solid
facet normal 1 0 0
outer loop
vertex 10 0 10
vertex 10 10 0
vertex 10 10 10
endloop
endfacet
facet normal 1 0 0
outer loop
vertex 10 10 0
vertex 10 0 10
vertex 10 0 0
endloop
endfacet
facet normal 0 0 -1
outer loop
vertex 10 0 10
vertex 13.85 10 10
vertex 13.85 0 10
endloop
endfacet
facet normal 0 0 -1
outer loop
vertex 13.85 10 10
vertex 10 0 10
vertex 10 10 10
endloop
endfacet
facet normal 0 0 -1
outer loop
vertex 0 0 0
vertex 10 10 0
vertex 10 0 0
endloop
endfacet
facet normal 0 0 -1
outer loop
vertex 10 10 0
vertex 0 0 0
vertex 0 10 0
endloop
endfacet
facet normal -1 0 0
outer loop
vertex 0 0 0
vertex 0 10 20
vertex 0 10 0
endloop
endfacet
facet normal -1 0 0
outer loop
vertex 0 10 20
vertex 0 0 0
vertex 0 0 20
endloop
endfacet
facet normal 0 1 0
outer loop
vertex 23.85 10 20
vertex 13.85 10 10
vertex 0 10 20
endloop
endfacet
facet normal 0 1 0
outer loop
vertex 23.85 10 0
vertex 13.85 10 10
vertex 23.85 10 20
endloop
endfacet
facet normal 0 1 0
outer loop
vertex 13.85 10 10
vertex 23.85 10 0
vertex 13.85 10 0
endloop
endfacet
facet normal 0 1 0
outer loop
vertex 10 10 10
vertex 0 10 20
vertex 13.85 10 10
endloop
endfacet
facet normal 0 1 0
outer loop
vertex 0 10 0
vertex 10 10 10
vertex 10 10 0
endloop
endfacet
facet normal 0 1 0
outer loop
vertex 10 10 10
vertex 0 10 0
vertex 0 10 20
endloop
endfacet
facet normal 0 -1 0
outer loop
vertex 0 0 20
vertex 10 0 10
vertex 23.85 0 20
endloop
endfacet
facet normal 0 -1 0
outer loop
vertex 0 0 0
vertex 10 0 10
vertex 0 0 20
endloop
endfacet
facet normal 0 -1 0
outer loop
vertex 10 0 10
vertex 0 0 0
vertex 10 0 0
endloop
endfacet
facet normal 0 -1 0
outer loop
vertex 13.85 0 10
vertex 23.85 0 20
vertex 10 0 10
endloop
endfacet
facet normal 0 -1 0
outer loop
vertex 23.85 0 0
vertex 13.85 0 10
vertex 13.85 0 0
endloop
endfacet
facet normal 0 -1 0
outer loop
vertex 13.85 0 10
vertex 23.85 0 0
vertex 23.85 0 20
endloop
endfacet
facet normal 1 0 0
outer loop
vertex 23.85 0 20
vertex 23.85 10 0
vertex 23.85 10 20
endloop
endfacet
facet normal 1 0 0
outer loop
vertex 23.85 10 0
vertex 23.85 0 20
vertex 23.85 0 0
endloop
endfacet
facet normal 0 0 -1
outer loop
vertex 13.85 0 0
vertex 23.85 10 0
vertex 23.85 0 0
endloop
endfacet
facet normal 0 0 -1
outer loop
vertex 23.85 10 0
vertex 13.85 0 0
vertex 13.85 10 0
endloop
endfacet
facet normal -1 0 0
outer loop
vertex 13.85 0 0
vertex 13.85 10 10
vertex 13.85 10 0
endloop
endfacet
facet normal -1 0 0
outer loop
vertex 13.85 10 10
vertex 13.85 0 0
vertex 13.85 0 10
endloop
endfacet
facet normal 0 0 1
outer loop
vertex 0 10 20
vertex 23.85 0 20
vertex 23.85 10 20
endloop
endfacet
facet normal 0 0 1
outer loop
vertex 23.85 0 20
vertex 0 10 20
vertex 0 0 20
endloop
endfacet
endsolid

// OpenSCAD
skirt_brim_line_width = 0.35;
gap_size = skirt_brim_line_width * 11;

cube([10,10,10]);
translate([10 + gap_size,0,0]) {
	cube([10,10,10]);
}
translate([0,0,10]) {
	cube([20 + gap_size,10,10]);
}
